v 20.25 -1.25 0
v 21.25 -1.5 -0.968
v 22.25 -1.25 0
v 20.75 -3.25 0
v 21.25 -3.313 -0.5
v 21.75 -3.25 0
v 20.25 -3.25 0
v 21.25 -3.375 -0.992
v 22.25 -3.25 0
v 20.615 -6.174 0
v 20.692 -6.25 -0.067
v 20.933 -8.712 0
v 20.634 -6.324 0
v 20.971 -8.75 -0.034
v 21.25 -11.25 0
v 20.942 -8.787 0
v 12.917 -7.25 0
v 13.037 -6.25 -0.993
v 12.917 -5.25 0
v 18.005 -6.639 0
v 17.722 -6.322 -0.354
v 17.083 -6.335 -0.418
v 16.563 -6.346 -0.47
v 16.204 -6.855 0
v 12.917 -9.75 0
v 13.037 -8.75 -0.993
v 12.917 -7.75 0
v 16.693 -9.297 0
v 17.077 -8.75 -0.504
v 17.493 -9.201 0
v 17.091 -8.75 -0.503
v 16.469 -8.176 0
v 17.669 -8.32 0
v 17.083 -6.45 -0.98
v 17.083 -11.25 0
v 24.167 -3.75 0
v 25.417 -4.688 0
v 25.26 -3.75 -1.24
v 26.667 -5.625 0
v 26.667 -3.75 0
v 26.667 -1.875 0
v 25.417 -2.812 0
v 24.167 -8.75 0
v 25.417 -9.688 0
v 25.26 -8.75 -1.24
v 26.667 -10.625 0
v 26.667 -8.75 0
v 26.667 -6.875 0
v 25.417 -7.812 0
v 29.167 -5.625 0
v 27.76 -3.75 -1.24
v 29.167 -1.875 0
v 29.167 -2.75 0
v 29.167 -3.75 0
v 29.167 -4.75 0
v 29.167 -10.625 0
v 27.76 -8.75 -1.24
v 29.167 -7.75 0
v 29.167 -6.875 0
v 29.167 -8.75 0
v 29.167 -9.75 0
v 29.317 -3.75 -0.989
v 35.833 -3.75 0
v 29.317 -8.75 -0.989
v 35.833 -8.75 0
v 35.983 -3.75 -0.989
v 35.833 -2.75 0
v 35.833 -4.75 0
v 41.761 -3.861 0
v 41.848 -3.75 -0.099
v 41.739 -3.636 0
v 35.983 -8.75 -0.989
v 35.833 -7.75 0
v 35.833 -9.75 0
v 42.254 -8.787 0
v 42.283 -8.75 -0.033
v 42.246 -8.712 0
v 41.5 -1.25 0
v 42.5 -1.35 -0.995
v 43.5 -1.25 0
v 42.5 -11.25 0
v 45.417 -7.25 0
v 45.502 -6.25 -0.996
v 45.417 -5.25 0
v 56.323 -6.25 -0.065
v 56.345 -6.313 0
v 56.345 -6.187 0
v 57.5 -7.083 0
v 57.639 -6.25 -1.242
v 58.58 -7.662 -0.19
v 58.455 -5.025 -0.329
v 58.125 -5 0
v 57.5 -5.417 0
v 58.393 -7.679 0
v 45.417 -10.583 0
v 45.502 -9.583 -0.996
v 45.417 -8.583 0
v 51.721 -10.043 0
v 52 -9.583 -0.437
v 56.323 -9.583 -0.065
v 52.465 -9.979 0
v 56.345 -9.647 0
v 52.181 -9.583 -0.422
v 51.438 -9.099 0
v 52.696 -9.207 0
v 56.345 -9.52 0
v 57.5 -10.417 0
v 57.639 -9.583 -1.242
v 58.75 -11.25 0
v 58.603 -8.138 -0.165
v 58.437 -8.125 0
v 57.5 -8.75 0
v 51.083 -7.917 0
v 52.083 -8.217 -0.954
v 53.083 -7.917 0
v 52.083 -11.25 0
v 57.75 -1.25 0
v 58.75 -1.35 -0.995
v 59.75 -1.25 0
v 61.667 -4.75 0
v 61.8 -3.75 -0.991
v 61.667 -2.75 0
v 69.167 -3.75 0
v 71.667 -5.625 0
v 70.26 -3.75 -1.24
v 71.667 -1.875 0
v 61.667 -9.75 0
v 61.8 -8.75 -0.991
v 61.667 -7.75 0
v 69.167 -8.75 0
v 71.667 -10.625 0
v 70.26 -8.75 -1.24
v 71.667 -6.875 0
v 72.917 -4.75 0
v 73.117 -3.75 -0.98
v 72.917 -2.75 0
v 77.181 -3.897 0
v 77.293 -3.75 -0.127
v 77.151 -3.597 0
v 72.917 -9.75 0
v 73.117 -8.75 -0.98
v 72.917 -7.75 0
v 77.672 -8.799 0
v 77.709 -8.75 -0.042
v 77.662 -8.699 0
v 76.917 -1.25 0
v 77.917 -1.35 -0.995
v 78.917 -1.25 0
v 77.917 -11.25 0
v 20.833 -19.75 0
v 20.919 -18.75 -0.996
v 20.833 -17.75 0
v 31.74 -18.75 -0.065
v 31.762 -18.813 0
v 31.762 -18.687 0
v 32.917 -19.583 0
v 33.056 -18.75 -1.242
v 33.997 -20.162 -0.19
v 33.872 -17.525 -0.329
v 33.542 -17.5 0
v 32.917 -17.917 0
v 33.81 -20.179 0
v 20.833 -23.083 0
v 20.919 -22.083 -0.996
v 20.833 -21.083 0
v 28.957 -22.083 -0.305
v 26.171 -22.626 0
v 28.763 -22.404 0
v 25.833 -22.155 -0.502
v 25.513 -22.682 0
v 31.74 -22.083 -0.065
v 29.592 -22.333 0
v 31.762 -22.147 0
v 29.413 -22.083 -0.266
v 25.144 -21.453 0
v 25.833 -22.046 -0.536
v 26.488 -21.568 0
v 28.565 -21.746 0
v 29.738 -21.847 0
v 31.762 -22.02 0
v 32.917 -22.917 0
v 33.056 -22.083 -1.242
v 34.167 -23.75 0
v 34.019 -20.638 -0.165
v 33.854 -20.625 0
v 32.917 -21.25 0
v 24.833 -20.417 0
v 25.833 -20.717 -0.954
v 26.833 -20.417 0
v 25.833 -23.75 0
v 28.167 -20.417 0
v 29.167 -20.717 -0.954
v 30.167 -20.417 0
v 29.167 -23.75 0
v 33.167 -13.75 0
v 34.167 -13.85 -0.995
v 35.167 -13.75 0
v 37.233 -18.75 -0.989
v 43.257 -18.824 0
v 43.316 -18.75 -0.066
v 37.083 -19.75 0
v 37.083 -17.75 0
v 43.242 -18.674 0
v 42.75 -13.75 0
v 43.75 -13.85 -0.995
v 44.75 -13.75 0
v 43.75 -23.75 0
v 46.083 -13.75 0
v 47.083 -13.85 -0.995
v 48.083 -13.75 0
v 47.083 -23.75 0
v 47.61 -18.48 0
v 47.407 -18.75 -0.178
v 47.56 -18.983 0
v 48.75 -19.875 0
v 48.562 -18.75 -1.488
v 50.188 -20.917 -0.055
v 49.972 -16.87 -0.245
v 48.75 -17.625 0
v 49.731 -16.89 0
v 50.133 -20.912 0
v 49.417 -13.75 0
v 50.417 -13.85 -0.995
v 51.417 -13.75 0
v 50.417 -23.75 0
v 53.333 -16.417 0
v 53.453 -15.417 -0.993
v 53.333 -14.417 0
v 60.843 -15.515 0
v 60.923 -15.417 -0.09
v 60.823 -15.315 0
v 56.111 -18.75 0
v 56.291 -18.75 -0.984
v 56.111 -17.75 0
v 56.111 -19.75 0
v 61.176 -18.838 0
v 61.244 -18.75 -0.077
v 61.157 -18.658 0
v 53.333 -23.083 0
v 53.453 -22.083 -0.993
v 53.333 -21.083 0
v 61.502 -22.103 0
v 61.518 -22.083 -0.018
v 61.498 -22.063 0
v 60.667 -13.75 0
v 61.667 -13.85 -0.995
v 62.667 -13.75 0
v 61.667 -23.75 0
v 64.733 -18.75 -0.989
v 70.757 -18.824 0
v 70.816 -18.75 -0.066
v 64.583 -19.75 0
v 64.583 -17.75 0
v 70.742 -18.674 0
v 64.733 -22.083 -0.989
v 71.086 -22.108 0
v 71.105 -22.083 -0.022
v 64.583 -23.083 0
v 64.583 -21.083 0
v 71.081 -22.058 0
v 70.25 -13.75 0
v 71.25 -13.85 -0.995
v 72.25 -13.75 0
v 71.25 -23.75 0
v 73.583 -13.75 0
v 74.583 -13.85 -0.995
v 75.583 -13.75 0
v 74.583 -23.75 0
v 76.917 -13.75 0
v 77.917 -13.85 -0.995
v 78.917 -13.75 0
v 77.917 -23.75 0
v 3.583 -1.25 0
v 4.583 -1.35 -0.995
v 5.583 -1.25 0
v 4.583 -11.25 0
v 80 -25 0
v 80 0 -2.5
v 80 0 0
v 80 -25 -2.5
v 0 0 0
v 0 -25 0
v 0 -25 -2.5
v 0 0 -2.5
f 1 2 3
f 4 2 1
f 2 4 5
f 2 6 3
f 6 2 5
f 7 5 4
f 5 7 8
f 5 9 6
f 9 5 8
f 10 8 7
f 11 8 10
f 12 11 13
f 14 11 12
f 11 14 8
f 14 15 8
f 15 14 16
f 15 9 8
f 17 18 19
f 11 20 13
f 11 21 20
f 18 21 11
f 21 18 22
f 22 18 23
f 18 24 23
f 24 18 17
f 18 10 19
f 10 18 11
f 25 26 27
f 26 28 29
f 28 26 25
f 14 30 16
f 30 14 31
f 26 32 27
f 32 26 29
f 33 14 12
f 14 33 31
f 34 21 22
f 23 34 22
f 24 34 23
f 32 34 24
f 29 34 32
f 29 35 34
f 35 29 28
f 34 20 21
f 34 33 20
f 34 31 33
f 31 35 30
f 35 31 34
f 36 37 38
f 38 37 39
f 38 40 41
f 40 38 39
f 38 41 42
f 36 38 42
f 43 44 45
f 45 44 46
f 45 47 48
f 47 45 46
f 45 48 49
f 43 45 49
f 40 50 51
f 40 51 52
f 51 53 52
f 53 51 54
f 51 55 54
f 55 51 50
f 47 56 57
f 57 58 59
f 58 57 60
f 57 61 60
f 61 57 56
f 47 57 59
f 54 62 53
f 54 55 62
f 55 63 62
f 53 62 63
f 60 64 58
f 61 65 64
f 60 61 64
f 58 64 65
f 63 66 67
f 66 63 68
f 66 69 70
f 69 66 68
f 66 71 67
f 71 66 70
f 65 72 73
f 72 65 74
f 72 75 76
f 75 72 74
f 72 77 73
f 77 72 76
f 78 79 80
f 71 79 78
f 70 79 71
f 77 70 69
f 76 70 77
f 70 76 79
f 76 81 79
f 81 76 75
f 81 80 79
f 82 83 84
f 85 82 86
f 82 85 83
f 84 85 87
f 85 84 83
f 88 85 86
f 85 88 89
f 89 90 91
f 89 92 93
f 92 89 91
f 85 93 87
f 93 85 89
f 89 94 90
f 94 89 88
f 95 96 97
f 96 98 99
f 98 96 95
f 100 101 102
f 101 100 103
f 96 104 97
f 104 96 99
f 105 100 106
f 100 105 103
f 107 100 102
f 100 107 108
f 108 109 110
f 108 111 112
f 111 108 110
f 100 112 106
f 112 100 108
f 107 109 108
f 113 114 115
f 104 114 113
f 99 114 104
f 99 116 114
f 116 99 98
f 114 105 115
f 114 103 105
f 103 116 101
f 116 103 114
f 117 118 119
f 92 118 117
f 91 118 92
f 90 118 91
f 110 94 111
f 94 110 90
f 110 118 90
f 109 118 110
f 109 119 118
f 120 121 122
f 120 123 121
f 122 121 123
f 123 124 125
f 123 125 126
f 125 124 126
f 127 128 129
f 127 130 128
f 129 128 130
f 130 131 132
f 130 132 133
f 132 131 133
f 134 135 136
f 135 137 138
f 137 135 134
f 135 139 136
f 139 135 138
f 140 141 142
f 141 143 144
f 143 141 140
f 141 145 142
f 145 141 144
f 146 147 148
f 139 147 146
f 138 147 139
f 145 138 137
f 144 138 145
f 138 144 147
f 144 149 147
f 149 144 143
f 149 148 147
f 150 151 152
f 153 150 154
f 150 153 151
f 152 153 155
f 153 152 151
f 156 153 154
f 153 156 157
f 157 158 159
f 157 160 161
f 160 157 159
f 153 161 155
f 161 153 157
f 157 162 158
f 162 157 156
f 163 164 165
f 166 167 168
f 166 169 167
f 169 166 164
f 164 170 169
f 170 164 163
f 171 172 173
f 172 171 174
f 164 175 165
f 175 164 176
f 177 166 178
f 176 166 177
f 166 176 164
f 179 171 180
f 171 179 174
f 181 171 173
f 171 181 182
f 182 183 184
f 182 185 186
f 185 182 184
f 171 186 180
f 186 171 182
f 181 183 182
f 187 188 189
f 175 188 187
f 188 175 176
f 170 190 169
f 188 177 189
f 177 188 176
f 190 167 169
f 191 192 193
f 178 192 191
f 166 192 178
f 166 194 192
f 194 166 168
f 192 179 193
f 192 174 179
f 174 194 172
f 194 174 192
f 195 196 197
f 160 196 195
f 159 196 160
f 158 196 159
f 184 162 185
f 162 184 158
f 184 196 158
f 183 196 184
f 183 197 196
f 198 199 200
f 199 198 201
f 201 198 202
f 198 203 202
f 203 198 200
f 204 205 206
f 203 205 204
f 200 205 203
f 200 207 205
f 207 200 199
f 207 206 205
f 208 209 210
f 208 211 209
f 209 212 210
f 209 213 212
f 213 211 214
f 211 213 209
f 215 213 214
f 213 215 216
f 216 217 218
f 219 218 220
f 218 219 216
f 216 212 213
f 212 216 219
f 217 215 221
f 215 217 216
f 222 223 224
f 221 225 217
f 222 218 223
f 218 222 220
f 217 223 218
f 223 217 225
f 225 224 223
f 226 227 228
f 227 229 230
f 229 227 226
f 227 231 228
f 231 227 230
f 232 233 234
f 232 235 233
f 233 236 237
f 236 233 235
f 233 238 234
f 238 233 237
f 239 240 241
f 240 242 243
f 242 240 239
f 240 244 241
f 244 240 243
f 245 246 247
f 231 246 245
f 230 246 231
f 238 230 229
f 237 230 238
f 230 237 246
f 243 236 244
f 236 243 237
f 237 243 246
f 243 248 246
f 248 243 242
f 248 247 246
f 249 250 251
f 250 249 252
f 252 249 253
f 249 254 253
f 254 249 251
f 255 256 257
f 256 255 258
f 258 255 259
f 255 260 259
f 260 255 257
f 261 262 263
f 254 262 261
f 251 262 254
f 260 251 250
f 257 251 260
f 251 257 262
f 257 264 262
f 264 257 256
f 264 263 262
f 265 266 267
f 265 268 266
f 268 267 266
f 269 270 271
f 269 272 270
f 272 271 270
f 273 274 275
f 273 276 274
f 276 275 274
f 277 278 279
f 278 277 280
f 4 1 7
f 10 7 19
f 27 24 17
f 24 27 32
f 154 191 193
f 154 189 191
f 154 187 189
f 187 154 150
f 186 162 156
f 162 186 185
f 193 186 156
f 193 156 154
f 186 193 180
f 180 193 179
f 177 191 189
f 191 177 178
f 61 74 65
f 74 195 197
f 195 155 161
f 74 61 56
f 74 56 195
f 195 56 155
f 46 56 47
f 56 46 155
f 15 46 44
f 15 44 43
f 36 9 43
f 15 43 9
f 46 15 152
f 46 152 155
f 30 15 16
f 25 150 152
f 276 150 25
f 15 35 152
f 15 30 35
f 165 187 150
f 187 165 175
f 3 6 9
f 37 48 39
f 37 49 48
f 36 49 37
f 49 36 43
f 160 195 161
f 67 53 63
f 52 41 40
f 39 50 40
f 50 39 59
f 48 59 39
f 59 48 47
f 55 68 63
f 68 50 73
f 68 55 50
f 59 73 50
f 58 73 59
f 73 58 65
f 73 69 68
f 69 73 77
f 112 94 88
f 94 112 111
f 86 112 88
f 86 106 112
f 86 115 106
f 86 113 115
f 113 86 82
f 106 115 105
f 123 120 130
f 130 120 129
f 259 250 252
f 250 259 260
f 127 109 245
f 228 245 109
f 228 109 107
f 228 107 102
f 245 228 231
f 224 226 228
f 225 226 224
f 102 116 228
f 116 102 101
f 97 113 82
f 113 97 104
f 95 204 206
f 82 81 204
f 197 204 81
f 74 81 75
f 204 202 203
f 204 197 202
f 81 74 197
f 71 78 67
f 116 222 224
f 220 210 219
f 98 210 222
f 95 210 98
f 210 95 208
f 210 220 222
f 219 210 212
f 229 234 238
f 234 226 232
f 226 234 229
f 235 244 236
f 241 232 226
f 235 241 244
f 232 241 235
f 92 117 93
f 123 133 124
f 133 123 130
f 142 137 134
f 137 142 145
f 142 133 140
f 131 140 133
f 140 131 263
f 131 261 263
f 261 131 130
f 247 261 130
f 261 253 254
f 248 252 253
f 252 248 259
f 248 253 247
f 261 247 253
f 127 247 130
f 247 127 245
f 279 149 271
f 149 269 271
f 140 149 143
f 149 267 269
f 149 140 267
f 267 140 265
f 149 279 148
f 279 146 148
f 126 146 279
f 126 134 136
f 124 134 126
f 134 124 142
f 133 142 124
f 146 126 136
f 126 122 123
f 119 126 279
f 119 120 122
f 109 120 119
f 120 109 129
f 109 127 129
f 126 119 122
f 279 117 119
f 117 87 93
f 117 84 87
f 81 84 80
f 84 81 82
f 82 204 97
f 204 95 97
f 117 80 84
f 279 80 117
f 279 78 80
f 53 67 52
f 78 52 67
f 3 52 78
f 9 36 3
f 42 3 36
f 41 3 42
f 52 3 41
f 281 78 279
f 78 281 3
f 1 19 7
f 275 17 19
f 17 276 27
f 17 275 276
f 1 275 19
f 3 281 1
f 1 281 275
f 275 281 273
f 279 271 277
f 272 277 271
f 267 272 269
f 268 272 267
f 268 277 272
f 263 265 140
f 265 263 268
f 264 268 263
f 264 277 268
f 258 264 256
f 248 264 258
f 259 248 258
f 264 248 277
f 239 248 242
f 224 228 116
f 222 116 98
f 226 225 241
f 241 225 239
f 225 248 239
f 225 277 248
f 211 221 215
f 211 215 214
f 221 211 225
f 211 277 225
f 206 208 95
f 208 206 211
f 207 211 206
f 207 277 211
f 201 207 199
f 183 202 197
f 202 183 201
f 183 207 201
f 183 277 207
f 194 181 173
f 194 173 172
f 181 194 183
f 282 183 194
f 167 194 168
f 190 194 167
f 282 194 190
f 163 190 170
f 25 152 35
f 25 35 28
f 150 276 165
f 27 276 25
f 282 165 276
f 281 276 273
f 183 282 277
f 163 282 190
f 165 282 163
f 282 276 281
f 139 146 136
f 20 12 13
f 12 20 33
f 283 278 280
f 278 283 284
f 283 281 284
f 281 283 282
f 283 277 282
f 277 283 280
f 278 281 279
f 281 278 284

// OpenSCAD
// file: cuneiform.scad
MAX_STROKE_WIDTH = 1/5;

module wedge(x, y, z, w, h, phi, o=false){
	// o is for offset, an experiment with moving the stroke so that its greatest depth would be at the origin point
	// It's not working very well; just don't use it for now
	// Also need to extend the stroke by delta if we do that
	
	s = w / sqrt(2);
	d = w / 2; // Depth of stroke, from head to deepest point
	l = sqrt(h*h - d*d); // Length of stroke, from deepest point to tip
	theta = atan(d/l); // Angle of stylus
	delta = o ? d*sin(theta) : 0; // Horizontal distance from head of wedge to greatest depth

	translate([x, y, z])
	rotate([0, 0, phi])
	translate([-delta, 0, 0])
	rotate([0, -theta, 0])
	rotate([45, 0, 0])
	translate([0, -s/2, -s/2])
	cube([l, s, s]);
}

module haken(x, y, z, s, d){
	w = s*sqrt(2);
	theta = atan(d/(w/2));
	translate([x, y, z])
	rotate([0, -theta, 0])
	translate([0, 0, -d])
	rotate([0, 0, -45])
	cube([s, s, d]);
}

module singlestroke(x, y, w, h){ // Vertical, positioned from top left corner
	w2 = min(h, w, MAX_STROKE_WIDTH);
	wedge(x+w/2, y, 0, w2, h, 90);
}

module doublestroke(x, y, w, h){
	w2 = min(h, w, MAX_STROKE_WIDTH);
	dist = min(w2, h/4);
	h2 = h - dist;
	h3 = h2 / 2;
	wedge(x+w/2, y, 0, w2, h3, 90);
	wedge(x+w/2, y+dist, 0, w2, h2, 90);
}

module triplestroke(x, y, w, h){
	w2 = min(h, w, MAX_STROKE_WIDTH);
	dist = min(w2, h/4);
	h2 = h - dist*2;
	h3 = min(h2/2, h-dist*2);
	wedge(x+w/2, y, 0, w2, h3, 90);
	wedge(x+w/2, y+dist, 0, w2, h3, 90);
	wedge(x+w/2, y+dist*2, 0, w2, h2, 90);
}

module hookstroke(x, y, w, h, factor=0.75){
//	hh = (w-h/2<0.0001) ? factor*h : h; // By default, the renderer produces hakens that are twice as tall as they are wide - but that means d = 0!
	// We fix this by reducing h by a factor < 1, when this happens
	// Comparing against epsilon instead of zero because transferring numbers from Python to SCAD can do weird things occasionally
	// Experiment: changing w instead of h to make hakens wider, which makes them more visible when they're pressed against verticals
	// Experiment undone - it works better changing h and having an adjustment in the renderer for when it's pressed against a vertical
//	ww = (w-h/2<0.0001) ? w/factor : w;
	ww = w;
	hh = (w-h/2<0.0001) ? h*factor : h;
	s = hh / sqrt(2);
	d = sqrt(ww*ww - hh*hh/4);
	deltaw = (ww-w);
	haken(x-deltaw, y+h/2, 0, s, d); // Use h instead of hh because the haken() module wants the position of the tip, and that needs to be at the midpoint of the *original* bounding box
}

module hrule(y, w, h=0.05){
	s = h*sqrt(2)/2;
	translate([0, y, -s])
		rotate([45, 0, 0])
			cube([w, h, h]);
}

module hatcharea(x, y, w, h){
	// TODO
}
// main file
use <cuneiform.scad>

scale([1,-1,1]){
	difference(){
		translate([0,0,-2.5])
			cube([80,25,2.5]);
		union(){
			translate([1.25,1.25,0]){
				scale([10.0,10.0,10.0]){
					translate([0,0,0]){
						singlestroke(0.16666666666666666, 0, 0.3333333333333333, 1);
					}
					translate([1.1666666666666665,0,0]){
						rotate(-90.0){
							singlestroke(-0.6666666666666667, 0, 0.3333333333333333, 0.8333333333333333);
						}
						rotate(-90.0){
							singlestroke(-0.9166666666666667, 0, 0.3333333333333333, 0.8333333333333333);
						}
						singlestroke(0.24999999999999997, 0.5000000000000001, 0.3333333333333333, 0.5);
						doublestroke(0.6666666666666666, 0, 0.3333333333333333, 1);
					}
					translate([2.2916666666666665,0,0]){
						hookstroke(0.0, 0.0, 0.25, 0.5);
						hookstroke(0.0, 0.5, 0.25, 0.5);
						hookstroke(0.25, 0.0, 0.25, 0.5);
						hookstroke(0.25, 0.5, 0.25, 0.5);
						rotate(-90.0){
							singlestroke(-0.41666666666666663, 0.5, 0.3333333333333333, 0.6666666666666667);
						}
						rotate(-90.0){
							singlestroke(-0.9166666666666667, 0.5, 0.3333333333333333, 0.6666666666666667);
						}
						rotate(-90.0){
							singlestroke(-0.41666666666666663, 1.1666666666666667, 0.3333333333333333, 0.6666666666666667);
						}
						rotate(-90.0){
							singlestroke(-0.9166666666666667, 1.1666666666666667, 0.3333333333333333, 0.6666666666666667);
						}
						singlestroke(1.6666666666666667, 0, 0.3333333333333333, 1);
					}
					translate([4.416666666666666,0,0]){
						rotate(-90.0){
							singlestroke(-0.6666666666666666, 0, 0.3333333333333333, 1.1666666666666665);
						}
						hookstroke(1.0833333333333333, 0.3333333333333333, 0.25, 0.3333333333333333);
						rotate(-90.0){
							singlestroke(-1.0, 0, 0.3333333333333333, 1.1666666666666665);
						}
						hookstroke(1.0833333333333333, 0.6666666666666666, 0.25, 0.3333333333333333);
						singlestroke(0.5, 0.6666666666666666, 0.3333333333333333, 0.3333333333333333);
						singlestroke(1.1666666666666665, 0, 0.3333333333333333, 1);
					}
					translate([6.041666666666666,0,0]){
						rotate(-90.0){
							singlestroke(-0.41666666666666663, 0, 0.3333333333333333, 0.75);
						}
						hookstroke(0.75, 0.0, 0.25, 0.5);
						rotate(-90.0){
							singlestroke(-0.9166666666666667, 0, 0.3333333333333333, 0.75);
						}
						hookstroke(0.75, 0.5, 0.25, 0.5);
					}
					translate([7.166666666666666,0,0]){
						rotate(-90.0){
							singlestroke(-0.41666666666666663, 0, 0.3333333333333333, 0.49999999999999994);
						}
						rotate(-90.0){
							singlestroke(-0.9166666666666667, 0, 0.3333333333333333, 0.49999999999999994);
						}
						singlestroke(0.33333333333333326, 0, 0.3333333333333333, 1);
					}
					translate([1.958333333333333,1.25,0]){
						rotate(-90.0){
							singlestroke(-0.6666666666666666, 0, 0.3333333333333333, 1.1666666666666665);
						}
						hookstroke(1.0833333333333333, 0.3333333333333333, 0.25, 0.3333333333333333);
						rotate(-90.0){
							singlestroke(-1.0, 0, 0.3333333333333333, 1.1666666666666665);
						}
						hookstroke(1.0833333333333333, 0.6666666666666666, 0.25, 0.3333333333333333);
						singlestroke(0.33333333333333337, 0.6666666666666666, 0.3333333333333333, 0.3333333333333333);
						singlestroke(0.6666666666666667, 0.6666666666666666, 0.3333333333333333, 0.3333333333333333);
						singlestroke(1.1666666666666665, 0, 0.3333333333333333, 1);
					}
					translate([3.583333333333333,1.25,0]){
						rotate(-90.0){
							singlestroke(-0.6666666666666667, 0, 0.3333333333333333, 0.6666666666666667);
						}
						singlestroke(0.5000000000000001, 0, 0.3333333333333333, 1);
						singlestroke(0.8333333333333335, 0, 0.3333333333333333, 1);
						hookstroke(1.0166666666666668, 0.2, 0.3, 0.6);
						singlestroke(1.166666666666667, 0, 0.3333333333333333, 1);
					}
					translate([5.208333333333333,1.25,0]){
						rotate(-90.0){
							singlestroke(-0.3333333333333333, 0, 0.3333333333333333, 0.8333333333333333);
						}
						rotate(-90.0){
							singlestroke(-0.6666666666666666, 0.27777777777777773, 0.3333333333333333, 0.5555555555555556);
						}
						rotate(-90.0){
							singlestroke(-1.0, 0, 0.3333333333333333, 0.8333333333333333);
						}
						singlestroke(0.6666666666666666, 0, 0.3333333333333333, 1);
					}
					translate([6.333333333333333,1.25,0]){
						rotate(-90.0){
							singlestroke(-0.6666666666666667, 0, 0.3333333333333333, 0.6666666666666667);
						}
						rotate(-90.0){
							singlestroke(-1.0, 0, 0.3333333333333333, 0.6666666666666667);
						}
						singlestroke(0.5000000000000001, 0, 0.3333333333333333, 1);
						singlestroke(0.8333333333333334, 0, 0.3333333333333333, 1);
						singlestroke(1.1666666666666665, 0, 0.3333333333333333, 1);
					}
				}
			}
		}
	}
}
